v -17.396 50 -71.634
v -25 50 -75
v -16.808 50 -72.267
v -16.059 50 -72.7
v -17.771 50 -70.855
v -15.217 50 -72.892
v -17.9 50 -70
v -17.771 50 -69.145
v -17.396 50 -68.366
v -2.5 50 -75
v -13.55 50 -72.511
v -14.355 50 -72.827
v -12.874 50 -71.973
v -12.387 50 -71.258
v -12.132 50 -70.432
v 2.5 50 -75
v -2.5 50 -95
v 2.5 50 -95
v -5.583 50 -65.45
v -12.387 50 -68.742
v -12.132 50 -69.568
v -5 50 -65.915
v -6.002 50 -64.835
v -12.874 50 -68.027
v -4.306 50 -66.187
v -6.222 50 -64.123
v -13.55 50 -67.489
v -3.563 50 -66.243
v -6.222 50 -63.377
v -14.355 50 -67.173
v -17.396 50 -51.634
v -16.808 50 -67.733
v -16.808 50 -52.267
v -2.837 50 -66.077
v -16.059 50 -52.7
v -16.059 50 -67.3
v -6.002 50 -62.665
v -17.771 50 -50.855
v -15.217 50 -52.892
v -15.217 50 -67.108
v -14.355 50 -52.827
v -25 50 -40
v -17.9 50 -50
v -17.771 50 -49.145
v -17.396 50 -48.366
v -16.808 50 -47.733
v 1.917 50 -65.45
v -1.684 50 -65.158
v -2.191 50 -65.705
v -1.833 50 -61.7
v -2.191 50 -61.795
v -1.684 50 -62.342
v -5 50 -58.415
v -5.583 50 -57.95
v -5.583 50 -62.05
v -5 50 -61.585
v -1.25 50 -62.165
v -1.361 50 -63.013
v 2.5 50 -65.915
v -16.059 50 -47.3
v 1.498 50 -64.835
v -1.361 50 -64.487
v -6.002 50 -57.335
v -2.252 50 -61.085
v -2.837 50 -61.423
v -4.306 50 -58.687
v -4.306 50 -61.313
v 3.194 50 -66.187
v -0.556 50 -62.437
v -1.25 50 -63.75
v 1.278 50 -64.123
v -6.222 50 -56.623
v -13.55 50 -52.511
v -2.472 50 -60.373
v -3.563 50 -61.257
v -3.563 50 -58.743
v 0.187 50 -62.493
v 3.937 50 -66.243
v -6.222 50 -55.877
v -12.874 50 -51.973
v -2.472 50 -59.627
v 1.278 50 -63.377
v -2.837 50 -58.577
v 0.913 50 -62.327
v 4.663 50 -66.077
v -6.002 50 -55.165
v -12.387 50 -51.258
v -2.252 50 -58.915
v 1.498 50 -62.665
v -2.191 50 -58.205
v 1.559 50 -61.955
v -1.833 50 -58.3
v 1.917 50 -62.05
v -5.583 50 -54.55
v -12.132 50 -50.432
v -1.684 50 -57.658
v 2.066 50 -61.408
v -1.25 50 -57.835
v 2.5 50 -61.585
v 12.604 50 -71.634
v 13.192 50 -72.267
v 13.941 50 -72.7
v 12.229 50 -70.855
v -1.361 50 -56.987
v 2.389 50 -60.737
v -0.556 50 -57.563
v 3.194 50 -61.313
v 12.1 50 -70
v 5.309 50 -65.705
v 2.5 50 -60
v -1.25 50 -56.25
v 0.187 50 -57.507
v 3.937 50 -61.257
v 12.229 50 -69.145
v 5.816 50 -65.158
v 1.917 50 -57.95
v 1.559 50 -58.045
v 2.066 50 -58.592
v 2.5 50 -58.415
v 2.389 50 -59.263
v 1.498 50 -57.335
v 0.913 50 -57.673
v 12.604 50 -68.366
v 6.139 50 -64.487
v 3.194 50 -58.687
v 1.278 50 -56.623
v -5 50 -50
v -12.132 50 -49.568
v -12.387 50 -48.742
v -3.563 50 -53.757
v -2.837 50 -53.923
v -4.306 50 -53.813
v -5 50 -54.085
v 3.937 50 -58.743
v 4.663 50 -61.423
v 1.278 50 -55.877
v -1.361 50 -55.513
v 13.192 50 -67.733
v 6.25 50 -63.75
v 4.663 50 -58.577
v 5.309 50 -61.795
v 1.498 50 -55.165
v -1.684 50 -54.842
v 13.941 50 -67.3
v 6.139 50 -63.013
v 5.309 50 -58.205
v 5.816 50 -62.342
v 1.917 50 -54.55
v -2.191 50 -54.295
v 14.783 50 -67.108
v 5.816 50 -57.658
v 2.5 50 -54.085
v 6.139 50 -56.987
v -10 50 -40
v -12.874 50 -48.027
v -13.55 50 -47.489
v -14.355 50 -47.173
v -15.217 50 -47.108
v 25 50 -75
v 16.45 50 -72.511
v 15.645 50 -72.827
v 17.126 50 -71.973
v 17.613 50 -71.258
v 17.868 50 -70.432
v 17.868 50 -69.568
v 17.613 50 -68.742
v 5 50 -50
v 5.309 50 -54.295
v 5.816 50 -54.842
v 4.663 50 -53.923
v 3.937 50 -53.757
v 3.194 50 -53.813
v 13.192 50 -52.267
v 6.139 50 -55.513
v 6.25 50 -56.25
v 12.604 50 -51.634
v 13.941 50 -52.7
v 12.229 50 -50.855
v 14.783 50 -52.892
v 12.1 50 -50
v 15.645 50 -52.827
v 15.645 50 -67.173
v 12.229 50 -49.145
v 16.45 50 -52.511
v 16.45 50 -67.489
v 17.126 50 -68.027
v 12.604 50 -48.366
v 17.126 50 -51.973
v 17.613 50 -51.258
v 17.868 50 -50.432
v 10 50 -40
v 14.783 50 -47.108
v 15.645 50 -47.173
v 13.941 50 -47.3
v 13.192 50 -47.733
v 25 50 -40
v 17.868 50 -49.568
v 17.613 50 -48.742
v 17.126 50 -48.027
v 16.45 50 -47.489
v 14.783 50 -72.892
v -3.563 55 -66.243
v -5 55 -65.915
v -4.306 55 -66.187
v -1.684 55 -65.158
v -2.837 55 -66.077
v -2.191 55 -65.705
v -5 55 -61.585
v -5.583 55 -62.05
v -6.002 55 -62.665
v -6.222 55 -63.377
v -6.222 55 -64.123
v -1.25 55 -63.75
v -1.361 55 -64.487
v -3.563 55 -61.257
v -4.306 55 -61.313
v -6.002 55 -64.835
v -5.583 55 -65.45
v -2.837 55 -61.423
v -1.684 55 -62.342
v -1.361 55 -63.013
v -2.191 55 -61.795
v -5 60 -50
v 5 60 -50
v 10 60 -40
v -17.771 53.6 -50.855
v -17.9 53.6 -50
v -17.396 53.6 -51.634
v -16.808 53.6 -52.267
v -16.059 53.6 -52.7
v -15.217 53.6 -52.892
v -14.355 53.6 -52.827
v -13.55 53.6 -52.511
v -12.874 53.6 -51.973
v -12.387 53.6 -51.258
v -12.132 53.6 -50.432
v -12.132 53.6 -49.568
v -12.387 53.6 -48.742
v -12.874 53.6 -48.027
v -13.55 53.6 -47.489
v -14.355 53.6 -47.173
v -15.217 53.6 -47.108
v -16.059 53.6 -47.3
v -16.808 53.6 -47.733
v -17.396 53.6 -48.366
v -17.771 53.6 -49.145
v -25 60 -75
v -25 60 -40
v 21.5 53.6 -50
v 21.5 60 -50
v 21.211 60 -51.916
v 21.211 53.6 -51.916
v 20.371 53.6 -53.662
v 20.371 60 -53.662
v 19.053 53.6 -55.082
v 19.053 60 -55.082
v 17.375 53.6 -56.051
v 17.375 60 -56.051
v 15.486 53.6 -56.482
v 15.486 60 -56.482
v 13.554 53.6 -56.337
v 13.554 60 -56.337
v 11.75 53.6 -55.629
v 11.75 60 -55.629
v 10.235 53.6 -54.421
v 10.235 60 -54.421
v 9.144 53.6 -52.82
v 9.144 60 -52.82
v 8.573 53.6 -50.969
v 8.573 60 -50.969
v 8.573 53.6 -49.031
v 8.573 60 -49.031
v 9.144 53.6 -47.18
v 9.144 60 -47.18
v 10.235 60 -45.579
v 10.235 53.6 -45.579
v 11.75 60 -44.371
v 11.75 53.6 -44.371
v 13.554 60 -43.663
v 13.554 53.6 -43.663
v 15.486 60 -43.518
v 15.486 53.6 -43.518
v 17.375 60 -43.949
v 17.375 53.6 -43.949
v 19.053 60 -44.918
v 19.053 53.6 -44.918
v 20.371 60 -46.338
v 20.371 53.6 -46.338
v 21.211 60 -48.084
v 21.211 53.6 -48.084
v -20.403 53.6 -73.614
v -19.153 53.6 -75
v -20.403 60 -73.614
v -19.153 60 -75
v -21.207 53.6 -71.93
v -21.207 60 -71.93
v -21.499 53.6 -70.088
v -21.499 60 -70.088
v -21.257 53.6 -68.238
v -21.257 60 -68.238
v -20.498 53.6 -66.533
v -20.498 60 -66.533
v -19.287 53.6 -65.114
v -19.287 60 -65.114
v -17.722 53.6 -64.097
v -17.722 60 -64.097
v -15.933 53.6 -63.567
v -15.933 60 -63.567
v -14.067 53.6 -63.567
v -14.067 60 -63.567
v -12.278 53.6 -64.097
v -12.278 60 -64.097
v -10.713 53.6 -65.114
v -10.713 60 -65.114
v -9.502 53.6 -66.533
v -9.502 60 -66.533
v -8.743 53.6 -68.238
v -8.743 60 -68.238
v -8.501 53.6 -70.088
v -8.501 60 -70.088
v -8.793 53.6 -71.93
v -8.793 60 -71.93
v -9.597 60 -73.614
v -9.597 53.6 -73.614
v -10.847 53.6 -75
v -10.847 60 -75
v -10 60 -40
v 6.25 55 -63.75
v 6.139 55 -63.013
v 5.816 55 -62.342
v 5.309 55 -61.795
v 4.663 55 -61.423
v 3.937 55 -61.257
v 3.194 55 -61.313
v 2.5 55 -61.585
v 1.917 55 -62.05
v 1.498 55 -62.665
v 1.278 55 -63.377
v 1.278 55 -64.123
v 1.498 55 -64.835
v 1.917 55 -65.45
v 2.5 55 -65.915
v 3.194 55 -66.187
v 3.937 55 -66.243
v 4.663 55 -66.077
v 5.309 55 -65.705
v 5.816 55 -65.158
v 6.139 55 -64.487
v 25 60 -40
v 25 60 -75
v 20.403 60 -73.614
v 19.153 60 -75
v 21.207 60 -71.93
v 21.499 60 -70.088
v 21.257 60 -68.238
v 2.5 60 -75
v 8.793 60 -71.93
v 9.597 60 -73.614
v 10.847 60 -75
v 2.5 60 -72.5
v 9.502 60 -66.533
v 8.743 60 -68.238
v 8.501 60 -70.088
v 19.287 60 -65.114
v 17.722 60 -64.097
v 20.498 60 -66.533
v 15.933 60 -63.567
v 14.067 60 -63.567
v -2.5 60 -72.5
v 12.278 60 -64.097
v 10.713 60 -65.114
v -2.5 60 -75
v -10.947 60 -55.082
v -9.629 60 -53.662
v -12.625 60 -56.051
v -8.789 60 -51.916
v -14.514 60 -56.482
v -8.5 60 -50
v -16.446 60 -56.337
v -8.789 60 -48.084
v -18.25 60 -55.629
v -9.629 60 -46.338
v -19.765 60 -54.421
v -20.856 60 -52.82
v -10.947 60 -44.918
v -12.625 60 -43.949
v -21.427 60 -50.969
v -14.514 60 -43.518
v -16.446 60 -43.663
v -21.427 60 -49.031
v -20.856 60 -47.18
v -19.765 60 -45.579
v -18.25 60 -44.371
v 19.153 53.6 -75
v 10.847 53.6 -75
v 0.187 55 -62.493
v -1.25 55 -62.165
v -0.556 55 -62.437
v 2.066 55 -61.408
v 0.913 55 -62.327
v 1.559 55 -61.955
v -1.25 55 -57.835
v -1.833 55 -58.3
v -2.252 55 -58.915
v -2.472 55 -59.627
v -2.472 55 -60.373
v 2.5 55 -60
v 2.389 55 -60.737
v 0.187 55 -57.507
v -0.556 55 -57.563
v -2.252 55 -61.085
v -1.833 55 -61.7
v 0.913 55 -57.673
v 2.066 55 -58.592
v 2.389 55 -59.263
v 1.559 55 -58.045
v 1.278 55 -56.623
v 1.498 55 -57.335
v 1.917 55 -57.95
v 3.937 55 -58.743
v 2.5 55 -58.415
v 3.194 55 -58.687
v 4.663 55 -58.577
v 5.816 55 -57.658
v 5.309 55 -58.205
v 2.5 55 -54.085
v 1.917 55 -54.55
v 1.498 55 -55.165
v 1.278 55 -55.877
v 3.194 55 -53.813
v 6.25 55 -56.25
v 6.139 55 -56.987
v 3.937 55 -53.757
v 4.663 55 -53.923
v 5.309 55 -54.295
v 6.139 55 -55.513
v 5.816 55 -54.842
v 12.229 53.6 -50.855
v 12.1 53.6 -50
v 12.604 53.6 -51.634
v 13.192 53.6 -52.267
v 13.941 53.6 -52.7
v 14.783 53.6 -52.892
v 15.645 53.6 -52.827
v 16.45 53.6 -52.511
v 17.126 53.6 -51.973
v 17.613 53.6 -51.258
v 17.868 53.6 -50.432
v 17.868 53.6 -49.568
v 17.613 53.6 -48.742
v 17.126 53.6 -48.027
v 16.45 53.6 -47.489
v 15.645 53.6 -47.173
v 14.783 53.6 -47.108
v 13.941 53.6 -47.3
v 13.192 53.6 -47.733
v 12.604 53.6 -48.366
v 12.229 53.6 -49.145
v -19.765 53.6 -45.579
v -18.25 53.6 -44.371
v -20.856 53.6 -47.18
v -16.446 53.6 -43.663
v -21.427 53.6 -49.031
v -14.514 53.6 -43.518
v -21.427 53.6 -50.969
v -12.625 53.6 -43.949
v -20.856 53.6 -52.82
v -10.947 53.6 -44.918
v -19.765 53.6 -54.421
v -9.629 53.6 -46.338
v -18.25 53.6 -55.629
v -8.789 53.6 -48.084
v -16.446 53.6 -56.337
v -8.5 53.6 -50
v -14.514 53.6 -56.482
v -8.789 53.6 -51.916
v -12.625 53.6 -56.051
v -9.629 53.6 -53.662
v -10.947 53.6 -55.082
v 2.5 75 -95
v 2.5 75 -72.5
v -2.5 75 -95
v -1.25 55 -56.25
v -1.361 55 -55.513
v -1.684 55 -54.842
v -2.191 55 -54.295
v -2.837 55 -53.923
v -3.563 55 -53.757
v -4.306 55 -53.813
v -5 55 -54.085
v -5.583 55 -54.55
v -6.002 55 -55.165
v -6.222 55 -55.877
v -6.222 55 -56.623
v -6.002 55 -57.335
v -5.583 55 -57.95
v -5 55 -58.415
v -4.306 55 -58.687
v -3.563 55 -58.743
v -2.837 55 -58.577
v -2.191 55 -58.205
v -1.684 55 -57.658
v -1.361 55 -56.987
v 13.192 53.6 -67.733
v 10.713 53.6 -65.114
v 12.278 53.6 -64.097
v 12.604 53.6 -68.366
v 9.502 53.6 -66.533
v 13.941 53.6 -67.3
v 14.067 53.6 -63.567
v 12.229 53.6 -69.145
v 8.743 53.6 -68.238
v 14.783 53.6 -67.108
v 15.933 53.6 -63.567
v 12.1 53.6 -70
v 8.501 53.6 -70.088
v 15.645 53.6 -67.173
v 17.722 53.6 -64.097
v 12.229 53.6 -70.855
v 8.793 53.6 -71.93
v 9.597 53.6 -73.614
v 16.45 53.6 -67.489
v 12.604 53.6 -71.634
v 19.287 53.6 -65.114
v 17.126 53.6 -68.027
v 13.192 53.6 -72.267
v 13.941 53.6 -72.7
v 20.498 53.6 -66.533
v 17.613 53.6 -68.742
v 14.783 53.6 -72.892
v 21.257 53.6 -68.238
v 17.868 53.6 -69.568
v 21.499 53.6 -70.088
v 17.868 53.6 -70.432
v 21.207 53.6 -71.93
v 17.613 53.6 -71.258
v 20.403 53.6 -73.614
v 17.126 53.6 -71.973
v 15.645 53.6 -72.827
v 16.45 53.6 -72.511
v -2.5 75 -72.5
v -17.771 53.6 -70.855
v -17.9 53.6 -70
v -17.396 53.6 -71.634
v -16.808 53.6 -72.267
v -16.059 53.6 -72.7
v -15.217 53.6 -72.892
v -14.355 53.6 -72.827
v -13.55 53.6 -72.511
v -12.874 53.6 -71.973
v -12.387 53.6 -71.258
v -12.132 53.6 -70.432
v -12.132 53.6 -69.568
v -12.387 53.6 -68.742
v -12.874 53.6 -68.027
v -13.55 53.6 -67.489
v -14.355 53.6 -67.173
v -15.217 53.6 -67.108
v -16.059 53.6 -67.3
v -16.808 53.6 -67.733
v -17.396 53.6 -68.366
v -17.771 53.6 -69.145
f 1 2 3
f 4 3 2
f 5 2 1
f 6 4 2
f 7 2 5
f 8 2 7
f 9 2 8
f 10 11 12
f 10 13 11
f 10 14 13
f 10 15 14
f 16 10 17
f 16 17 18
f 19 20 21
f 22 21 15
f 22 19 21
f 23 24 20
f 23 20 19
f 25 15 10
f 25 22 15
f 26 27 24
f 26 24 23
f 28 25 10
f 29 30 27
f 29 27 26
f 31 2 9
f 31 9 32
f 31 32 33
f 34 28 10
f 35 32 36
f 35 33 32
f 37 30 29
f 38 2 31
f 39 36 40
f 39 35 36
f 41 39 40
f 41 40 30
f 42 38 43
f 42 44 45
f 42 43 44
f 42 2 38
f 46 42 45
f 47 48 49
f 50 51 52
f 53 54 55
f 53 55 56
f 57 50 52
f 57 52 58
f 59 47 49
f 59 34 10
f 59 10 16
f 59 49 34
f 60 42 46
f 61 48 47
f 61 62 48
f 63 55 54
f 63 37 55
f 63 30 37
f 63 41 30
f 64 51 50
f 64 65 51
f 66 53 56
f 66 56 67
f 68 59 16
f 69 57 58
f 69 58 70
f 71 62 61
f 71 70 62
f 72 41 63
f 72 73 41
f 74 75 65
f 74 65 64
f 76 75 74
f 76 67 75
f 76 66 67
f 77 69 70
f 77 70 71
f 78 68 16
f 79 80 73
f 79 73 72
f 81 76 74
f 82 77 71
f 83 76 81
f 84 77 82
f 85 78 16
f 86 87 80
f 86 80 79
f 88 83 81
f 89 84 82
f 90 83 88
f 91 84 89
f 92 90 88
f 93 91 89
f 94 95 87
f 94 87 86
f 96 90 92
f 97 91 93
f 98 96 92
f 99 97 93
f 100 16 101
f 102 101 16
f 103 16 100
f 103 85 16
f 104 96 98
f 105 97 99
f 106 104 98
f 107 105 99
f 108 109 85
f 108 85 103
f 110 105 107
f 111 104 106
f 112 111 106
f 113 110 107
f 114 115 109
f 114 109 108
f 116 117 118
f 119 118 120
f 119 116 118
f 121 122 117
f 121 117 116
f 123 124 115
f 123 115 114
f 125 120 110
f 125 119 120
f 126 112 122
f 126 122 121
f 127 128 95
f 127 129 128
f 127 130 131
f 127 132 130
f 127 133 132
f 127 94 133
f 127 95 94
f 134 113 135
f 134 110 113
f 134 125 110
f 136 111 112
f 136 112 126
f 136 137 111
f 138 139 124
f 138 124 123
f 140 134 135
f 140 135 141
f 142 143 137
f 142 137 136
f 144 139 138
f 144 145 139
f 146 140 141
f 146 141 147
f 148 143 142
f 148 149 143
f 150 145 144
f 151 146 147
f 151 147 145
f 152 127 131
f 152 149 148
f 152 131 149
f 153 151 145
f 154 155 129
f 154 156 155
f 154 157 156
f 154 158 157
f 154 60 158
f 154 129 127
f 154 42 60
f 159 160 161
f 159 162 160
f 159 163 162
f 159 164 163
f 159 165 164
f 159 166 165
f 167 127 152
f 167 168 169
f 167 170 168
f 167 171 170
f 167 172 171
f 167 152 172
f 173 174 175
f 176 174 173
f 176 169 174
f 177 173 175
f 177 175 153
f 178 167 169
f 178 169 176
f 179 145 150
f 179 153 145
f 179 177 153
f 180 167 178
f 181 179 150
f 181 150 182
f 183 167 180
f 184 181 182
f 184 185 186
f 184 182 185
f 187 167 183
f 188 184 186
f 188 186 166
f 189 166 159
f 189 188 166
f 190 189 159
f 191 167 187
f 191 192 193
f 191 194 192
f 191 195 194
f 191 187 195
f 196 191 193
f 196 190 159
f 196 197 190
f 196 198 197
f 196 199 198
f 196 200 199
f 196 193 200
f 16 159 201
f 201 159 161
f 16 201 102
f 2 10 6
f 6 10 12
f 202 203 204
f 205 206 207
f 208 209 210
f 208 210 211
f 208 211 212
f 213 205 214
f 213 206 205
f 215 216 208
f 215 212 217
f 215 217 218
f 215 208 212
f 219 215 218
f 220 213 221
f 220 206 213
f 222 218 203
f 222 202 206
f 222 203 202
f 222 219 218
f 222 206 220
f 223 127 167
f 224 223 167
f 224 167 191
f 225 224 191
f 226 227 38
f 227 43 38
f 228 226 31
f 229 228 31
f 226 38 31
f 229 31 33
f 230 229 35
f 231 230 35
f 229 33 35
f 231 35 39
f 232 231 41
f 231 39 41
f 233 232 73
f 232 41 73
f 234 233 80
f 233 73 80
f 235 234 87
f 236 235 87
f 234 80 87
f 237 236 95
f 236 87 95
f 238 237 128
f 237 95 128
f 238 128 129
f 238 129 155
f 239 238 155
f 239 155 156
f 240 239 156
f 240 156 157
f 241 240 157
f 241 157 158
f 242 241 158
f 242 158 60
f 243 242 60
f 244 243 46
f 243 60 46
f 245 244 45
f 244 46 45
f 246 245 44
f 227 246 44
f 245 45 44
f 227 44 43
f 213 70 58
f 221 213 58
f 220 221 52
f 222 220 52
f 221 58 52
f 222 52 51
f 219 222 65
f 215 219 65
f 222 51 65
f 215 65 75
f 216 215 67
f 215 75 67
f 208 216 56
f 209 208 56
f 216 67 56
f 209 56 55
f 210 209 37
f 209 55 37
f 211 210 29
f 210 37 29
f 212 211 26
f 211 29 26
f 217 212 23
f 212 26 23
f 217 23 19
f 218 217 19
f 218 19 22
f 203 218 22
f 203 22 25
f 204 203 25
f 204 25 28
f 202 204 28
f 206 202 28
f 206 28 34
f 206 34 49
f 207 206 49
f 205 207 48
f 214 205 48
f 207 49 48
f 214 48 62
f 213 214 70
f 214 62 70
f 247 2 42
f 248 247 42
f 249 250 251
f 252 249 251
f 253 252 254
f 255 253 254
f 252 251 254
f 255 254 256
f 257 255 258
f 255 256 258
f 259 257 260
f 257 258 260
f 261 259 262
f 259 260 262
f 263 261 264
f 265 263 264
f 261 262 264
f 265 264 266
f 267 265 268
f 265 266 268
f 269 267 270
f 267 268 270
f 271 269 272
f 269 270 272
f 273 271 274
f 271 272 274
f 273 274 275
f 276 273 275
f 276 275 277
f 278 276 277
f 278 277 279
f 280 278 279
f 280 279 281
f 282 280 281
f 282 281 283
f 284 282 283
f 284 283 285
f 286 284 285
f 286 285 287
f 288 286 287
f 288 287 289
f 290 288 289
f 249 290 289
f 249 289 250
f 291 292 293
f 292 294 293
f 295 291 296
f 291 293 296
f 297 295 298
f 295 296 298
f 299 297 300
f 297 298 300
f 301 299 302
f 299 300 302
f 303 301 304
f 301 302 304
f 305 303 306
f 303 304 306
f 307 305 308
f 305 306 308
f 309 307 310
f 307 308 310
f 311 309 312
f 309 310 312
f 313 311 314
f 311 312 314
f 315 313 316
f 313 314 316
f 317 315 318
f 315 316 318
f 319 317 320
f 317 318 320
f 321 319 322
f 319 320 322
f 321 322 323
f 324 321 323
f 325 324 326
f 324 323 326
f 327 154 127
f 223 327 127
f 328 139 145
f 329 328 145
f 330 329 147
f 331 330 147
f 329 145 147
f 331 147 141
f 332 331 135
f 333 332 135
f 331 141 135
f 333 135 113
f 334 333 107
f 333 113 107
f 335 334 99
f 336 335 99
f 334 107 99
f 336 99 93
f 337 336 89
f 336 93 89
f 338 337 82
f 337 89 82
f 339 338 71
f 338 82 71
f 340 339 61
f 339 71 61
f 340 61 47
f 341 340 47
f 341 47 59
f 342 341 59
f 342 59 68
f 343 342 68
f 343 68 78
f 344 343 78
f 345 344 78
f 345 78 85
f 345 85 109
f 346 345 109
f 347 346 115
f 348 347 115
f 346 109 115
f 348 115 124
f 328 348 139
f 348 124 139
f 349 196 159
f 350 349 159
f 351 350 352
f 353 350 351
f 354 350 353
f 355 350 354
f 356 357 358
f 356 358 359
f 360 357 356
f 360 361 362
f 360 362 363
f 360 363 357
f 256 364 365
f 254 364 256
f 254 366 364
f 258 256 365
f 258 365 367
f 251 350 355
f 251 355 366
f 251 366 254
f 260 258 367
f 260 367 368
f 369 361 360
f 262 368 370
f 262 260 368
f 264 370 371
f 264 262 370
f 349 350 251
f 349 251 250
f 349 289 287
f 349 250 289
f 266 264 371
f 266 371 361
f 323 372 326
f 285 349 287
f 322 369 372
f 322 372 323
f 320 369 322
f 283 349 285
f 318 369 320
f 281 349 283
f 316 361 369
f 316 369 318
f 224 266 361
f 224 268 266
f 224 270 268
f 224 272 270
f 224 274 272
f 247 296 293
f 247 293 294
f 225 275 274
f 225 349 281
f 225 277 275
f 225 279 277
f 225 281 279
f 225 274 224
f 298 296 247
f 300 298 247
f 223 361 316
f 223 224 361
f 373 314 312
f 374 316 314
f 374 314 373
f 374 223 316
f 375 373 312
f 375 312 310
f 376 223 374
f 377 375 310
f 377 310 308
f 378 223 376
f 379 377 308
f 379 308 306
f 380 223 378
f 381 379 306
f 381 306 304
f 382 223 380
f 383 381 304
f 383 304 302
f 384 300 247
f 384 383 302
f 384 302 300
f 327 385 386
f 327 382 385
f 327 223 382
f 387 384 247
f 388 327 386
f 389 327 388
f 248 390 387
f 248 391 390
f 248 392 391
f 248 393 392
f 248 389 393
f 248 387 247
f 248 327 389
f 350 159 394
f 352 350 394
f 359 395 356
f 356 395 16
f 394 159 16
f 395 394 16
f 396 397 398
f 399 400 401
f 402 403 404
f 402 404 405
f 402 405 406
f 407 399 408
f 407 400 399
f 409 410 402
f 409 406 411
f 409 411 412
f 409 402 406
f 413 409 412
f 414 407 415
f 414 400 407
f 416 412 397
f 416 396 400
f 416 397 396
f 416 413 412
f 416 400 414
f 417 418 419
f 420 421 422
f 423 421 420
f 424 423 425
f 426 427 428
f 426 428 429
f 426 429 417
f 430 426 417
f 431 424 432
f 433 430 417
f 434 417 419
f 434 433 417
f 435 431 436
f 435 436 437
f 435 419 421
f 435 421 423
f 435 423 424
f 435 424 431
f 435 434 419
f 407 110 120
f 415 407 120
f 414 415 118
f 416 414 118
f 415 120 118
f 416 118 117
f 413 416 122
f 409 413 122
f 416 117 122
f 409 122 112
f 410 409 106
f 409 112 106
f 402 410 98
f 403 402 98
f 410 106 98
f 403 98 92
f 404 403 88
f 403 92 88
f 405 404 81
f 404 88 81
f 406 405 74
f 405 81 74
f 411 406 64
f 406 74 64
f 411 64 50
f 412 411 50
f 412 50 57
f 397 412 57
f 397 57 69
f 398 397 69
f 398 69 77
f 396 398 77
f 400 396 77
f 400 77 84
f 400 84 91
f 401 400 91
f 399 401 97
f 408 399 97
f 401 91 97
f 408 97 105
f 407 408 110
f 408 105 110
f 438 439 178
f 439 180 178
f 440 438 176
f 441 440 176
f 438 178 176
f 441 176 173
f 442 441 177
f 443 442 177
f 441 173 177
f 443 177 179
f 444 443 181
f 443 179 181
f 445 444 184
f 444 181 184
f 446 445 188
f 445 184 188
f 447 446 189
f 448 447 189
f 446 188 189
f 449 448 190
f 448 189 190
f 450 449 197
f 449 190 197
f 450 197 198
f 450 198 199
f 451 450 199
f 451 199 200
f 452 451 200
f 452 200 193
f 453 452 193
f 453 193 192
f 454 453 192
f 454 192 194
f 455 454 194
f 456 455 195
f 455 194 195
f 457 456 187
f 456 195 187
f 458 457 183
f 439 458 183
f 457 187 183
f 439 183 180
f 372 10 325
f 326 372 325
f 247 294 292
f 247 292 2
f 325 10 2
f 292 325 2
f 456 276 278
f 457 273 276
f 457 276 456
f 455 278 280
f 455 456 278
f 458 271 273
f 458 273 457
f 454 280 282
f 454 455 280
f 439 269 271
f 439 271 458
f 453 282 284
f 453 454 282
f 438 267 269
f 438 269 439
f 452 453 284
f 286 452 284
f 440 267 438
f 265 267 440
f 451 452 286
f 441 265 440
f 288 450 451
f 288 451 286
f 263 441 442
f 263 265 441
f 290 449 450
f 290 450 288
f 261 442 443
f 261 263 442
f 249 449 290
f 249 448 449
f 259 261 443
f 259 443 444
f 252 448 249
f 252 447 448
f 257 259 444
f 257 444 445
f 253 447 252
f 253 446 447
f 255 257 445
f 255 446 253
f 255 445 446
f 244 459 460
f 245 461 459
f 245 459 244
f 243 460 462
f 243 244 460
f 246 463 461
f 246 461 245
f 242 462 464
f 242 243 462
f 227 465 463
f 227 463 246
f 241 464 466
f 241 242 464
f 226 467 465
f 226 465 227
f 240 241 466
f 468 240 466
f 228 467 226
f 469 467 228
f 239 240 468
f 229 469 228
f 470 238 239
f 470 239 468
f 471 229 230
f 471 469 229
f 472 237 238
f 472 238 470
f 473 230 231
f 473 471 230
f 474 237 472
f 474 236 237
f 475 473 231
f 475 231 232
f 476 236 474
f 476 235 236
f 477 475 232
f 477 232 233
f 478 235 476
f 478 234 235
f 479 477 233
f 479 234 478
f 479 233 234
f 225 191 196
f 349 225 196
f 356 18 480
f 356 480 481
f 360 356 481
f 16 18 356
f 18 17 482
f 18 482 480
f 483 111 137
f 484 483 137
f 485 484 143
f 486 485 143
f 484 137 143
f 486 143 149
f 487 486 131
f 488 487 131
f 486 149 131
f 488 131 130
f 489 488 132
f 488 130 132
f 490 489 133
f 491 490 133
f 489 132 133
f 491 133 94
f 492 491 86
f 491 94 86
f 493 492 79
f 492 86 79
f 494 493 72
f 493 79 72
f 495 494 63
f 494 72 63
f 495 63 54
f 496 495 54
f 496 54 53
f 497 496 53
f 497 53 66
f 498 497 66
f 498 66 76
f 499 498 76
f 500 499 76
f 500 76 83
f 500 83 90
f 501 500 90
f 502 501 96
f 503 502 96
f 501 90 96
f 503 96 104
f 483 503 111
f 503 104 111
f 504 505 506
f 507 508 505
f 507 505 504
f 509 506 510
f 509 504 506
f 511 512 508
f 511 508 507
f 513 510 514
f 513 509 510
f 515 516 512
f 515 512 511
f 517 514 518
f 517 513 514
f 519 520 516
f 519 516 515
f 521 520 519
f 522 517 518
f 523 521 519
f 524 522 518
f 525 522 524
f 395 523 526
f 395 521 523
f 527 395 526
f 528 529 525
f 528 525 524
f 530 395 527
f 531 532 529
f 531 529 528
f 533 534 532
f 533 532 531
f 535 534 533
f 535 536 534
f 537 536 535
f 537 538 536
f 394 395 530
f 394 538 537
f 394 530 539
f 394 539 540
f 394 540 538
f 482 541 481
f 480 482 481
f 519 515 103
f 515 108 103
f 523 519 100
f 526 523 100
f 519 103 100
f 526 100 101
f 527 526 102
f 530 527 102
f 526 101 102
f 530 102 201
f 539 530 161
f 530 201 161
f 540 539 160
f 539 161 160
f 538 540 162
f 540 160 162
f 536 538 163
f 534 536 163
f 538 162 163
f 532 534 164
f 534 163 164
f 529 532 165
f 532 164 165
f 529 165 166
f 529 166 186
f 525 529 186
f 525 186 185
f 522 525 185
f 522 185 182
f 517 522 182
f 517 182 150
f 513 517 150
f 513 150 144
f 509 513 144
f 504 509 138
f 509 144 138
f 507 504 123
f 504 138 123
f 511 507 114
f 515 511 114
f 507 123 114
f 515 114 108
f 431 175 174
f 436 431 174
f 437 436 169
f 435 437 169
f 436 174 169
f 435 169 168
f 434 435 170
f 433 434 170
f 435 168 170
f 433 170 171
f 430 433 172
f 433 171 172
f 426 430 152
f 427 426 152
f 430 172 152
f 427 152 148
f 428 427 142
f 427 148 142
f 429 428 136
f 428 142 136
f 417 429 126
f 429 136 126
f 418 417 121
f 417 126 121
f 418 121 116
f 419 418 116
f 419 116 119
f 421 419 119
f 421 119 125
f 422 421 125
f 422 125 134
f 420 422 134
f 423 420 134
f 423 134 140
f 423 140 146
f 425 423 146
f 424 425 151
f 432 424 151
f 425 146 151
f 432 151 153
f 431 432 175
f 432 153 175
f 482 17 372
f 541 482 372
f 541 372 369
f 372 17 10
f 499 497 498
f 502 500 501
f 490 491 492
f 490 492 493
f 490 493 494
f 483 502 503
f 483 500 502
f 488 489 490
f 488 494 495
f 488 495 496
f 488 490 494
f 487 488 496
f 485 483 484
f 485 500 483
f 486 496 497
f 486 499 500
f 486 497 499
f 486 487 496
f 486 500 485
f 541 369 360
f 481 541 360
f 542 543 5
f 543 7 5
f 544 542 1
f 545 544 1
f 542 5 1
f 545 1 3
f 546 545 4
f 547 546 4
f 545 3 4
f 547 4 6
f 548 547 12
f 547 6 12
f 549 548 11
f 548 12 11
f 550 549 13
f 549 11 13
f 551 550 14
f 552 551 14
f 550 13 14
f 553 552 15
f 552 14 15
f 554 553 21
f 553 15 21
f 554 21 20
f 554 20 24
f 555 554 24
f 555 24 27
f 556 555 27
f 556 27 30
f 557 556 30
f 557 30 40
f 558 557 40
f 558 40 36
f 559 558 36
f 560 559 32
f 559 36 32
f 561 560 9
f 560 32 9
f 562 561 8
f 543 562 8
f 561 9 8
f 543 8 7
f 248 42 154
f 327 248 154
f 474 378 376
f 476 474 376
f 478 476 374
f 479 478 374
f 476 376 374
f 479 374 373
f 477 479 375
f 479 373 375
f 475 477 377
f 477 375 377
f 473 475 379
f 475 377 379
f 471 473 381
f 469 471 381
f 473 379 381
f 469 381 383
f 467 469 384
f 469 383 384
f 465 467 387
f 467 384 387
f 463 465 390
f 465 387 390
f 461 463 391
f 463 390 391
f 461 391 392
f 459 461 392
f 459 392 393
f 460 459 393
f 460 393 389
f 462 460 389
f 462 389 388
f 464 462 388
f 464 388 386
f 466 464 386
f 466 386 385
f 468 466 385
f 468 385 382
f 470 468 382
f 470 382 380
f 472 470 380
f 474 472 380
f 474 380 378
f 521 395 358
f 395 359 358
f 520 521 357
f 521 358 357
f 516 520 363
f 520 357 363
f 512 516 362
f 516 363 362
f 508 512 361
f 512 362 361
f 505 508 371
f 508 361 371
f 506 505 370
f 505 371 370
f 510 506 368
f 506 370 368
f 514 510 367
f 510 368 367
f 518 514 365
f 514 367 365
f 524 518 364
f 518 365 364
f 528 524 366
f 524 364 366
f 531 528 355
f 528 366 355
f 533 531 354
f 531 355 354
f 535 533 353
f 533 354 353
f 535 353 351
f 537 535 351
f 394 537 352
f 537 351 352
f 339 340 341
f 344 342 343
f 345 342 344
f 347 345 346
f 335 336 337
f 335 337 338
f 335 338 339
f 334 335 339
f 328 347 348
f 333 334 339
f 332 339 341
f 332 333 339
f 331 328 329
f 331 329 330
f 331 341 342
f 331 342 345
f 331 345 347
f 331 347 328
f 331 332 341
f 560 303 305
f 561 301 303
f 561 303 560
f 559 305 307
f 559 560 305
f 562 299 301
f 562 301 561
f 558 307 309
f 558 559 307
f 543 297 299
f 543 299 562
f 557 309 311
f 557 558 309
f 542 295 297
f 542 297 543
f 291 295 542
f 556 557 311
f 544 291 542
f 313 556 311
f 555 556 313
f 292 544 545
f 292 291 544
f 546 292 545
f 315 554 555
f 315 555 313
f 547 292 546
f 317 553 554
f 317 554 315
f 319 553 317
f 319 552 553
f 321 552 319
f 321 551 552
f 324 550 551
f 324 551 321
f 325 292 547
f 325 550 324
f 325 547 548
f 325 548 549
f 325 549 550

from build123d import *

# Parameters (mm, degrees)
PAD023_DEPTH        = 10
SKETCH037_R         = 2.5
POCKET009_DEPTH     = 5
HOLE004_D           = 5.8
HOLE004_DEPTH       = 25
HOLE004_CBORE_D     = 13
HOLE004_CBORE_DEPTH = 6.4
SKETCH039_W         = 5
SKETCH039_H         = 22.5
PAD024_DEPTH        = 25


with BuildPart() as part:
    # Sketch036 → Pad023 (new body)
    with BuildSketch(Plane.XZ.offset(-50)):
        Polygon((-25, -40), (-10, -40), (-5, -50), (5, -50), (10, -40), (25, -40), (25, -75), (-25, -75), align=None)
    extrude(amount=-PAD023_DEPTH)

    # Sketch037 → Pocket009 (cut)
    with BuildSketch(Plane.XZ.offset(-50)):
        with Locations((-3.75, -56.25)):
            Circle(SKETCH037_R)
        with Locations((3.75, -56.25)):
            Circle(SKETCH037_R)
        with Locations((0, -60)):
            Circle(SKETCH037_R)
        with Locations((3.75, -63.75)):
            Circle(SKETCH037_R)
        with Locations((-3.75, -63.75)):
            Circle(SKETCH037_R)
    extrude(amount=-POCKET009_DEPTH, mode=Mode.SUBTRACT)

    # Hole004
    with Locations(Plane(origin=(0, 60, 0), x_dir=(1, 0, 0), z_dir=(0, 1, 0))):
        with Locations((-15, 50), (-15, 70), (15, 70), (15, 50)):
            CounterBoreHole(HOLE004_D / 2, HOLE004_CBORE_D / 2, HOLE004_CBORE_DEPTH, depth=HOLE004_DEPTH)

    # Sketch039 → Pad024 (join)
    with BuildSketch(Plane.XZ.offset(-50)):
        with Locations((0, -83.75)):
            Rectangle(SKETCH039_W, SKETCH039_H)
    extrude(amount=-PAD024_DEPTH)


solid = part.part
